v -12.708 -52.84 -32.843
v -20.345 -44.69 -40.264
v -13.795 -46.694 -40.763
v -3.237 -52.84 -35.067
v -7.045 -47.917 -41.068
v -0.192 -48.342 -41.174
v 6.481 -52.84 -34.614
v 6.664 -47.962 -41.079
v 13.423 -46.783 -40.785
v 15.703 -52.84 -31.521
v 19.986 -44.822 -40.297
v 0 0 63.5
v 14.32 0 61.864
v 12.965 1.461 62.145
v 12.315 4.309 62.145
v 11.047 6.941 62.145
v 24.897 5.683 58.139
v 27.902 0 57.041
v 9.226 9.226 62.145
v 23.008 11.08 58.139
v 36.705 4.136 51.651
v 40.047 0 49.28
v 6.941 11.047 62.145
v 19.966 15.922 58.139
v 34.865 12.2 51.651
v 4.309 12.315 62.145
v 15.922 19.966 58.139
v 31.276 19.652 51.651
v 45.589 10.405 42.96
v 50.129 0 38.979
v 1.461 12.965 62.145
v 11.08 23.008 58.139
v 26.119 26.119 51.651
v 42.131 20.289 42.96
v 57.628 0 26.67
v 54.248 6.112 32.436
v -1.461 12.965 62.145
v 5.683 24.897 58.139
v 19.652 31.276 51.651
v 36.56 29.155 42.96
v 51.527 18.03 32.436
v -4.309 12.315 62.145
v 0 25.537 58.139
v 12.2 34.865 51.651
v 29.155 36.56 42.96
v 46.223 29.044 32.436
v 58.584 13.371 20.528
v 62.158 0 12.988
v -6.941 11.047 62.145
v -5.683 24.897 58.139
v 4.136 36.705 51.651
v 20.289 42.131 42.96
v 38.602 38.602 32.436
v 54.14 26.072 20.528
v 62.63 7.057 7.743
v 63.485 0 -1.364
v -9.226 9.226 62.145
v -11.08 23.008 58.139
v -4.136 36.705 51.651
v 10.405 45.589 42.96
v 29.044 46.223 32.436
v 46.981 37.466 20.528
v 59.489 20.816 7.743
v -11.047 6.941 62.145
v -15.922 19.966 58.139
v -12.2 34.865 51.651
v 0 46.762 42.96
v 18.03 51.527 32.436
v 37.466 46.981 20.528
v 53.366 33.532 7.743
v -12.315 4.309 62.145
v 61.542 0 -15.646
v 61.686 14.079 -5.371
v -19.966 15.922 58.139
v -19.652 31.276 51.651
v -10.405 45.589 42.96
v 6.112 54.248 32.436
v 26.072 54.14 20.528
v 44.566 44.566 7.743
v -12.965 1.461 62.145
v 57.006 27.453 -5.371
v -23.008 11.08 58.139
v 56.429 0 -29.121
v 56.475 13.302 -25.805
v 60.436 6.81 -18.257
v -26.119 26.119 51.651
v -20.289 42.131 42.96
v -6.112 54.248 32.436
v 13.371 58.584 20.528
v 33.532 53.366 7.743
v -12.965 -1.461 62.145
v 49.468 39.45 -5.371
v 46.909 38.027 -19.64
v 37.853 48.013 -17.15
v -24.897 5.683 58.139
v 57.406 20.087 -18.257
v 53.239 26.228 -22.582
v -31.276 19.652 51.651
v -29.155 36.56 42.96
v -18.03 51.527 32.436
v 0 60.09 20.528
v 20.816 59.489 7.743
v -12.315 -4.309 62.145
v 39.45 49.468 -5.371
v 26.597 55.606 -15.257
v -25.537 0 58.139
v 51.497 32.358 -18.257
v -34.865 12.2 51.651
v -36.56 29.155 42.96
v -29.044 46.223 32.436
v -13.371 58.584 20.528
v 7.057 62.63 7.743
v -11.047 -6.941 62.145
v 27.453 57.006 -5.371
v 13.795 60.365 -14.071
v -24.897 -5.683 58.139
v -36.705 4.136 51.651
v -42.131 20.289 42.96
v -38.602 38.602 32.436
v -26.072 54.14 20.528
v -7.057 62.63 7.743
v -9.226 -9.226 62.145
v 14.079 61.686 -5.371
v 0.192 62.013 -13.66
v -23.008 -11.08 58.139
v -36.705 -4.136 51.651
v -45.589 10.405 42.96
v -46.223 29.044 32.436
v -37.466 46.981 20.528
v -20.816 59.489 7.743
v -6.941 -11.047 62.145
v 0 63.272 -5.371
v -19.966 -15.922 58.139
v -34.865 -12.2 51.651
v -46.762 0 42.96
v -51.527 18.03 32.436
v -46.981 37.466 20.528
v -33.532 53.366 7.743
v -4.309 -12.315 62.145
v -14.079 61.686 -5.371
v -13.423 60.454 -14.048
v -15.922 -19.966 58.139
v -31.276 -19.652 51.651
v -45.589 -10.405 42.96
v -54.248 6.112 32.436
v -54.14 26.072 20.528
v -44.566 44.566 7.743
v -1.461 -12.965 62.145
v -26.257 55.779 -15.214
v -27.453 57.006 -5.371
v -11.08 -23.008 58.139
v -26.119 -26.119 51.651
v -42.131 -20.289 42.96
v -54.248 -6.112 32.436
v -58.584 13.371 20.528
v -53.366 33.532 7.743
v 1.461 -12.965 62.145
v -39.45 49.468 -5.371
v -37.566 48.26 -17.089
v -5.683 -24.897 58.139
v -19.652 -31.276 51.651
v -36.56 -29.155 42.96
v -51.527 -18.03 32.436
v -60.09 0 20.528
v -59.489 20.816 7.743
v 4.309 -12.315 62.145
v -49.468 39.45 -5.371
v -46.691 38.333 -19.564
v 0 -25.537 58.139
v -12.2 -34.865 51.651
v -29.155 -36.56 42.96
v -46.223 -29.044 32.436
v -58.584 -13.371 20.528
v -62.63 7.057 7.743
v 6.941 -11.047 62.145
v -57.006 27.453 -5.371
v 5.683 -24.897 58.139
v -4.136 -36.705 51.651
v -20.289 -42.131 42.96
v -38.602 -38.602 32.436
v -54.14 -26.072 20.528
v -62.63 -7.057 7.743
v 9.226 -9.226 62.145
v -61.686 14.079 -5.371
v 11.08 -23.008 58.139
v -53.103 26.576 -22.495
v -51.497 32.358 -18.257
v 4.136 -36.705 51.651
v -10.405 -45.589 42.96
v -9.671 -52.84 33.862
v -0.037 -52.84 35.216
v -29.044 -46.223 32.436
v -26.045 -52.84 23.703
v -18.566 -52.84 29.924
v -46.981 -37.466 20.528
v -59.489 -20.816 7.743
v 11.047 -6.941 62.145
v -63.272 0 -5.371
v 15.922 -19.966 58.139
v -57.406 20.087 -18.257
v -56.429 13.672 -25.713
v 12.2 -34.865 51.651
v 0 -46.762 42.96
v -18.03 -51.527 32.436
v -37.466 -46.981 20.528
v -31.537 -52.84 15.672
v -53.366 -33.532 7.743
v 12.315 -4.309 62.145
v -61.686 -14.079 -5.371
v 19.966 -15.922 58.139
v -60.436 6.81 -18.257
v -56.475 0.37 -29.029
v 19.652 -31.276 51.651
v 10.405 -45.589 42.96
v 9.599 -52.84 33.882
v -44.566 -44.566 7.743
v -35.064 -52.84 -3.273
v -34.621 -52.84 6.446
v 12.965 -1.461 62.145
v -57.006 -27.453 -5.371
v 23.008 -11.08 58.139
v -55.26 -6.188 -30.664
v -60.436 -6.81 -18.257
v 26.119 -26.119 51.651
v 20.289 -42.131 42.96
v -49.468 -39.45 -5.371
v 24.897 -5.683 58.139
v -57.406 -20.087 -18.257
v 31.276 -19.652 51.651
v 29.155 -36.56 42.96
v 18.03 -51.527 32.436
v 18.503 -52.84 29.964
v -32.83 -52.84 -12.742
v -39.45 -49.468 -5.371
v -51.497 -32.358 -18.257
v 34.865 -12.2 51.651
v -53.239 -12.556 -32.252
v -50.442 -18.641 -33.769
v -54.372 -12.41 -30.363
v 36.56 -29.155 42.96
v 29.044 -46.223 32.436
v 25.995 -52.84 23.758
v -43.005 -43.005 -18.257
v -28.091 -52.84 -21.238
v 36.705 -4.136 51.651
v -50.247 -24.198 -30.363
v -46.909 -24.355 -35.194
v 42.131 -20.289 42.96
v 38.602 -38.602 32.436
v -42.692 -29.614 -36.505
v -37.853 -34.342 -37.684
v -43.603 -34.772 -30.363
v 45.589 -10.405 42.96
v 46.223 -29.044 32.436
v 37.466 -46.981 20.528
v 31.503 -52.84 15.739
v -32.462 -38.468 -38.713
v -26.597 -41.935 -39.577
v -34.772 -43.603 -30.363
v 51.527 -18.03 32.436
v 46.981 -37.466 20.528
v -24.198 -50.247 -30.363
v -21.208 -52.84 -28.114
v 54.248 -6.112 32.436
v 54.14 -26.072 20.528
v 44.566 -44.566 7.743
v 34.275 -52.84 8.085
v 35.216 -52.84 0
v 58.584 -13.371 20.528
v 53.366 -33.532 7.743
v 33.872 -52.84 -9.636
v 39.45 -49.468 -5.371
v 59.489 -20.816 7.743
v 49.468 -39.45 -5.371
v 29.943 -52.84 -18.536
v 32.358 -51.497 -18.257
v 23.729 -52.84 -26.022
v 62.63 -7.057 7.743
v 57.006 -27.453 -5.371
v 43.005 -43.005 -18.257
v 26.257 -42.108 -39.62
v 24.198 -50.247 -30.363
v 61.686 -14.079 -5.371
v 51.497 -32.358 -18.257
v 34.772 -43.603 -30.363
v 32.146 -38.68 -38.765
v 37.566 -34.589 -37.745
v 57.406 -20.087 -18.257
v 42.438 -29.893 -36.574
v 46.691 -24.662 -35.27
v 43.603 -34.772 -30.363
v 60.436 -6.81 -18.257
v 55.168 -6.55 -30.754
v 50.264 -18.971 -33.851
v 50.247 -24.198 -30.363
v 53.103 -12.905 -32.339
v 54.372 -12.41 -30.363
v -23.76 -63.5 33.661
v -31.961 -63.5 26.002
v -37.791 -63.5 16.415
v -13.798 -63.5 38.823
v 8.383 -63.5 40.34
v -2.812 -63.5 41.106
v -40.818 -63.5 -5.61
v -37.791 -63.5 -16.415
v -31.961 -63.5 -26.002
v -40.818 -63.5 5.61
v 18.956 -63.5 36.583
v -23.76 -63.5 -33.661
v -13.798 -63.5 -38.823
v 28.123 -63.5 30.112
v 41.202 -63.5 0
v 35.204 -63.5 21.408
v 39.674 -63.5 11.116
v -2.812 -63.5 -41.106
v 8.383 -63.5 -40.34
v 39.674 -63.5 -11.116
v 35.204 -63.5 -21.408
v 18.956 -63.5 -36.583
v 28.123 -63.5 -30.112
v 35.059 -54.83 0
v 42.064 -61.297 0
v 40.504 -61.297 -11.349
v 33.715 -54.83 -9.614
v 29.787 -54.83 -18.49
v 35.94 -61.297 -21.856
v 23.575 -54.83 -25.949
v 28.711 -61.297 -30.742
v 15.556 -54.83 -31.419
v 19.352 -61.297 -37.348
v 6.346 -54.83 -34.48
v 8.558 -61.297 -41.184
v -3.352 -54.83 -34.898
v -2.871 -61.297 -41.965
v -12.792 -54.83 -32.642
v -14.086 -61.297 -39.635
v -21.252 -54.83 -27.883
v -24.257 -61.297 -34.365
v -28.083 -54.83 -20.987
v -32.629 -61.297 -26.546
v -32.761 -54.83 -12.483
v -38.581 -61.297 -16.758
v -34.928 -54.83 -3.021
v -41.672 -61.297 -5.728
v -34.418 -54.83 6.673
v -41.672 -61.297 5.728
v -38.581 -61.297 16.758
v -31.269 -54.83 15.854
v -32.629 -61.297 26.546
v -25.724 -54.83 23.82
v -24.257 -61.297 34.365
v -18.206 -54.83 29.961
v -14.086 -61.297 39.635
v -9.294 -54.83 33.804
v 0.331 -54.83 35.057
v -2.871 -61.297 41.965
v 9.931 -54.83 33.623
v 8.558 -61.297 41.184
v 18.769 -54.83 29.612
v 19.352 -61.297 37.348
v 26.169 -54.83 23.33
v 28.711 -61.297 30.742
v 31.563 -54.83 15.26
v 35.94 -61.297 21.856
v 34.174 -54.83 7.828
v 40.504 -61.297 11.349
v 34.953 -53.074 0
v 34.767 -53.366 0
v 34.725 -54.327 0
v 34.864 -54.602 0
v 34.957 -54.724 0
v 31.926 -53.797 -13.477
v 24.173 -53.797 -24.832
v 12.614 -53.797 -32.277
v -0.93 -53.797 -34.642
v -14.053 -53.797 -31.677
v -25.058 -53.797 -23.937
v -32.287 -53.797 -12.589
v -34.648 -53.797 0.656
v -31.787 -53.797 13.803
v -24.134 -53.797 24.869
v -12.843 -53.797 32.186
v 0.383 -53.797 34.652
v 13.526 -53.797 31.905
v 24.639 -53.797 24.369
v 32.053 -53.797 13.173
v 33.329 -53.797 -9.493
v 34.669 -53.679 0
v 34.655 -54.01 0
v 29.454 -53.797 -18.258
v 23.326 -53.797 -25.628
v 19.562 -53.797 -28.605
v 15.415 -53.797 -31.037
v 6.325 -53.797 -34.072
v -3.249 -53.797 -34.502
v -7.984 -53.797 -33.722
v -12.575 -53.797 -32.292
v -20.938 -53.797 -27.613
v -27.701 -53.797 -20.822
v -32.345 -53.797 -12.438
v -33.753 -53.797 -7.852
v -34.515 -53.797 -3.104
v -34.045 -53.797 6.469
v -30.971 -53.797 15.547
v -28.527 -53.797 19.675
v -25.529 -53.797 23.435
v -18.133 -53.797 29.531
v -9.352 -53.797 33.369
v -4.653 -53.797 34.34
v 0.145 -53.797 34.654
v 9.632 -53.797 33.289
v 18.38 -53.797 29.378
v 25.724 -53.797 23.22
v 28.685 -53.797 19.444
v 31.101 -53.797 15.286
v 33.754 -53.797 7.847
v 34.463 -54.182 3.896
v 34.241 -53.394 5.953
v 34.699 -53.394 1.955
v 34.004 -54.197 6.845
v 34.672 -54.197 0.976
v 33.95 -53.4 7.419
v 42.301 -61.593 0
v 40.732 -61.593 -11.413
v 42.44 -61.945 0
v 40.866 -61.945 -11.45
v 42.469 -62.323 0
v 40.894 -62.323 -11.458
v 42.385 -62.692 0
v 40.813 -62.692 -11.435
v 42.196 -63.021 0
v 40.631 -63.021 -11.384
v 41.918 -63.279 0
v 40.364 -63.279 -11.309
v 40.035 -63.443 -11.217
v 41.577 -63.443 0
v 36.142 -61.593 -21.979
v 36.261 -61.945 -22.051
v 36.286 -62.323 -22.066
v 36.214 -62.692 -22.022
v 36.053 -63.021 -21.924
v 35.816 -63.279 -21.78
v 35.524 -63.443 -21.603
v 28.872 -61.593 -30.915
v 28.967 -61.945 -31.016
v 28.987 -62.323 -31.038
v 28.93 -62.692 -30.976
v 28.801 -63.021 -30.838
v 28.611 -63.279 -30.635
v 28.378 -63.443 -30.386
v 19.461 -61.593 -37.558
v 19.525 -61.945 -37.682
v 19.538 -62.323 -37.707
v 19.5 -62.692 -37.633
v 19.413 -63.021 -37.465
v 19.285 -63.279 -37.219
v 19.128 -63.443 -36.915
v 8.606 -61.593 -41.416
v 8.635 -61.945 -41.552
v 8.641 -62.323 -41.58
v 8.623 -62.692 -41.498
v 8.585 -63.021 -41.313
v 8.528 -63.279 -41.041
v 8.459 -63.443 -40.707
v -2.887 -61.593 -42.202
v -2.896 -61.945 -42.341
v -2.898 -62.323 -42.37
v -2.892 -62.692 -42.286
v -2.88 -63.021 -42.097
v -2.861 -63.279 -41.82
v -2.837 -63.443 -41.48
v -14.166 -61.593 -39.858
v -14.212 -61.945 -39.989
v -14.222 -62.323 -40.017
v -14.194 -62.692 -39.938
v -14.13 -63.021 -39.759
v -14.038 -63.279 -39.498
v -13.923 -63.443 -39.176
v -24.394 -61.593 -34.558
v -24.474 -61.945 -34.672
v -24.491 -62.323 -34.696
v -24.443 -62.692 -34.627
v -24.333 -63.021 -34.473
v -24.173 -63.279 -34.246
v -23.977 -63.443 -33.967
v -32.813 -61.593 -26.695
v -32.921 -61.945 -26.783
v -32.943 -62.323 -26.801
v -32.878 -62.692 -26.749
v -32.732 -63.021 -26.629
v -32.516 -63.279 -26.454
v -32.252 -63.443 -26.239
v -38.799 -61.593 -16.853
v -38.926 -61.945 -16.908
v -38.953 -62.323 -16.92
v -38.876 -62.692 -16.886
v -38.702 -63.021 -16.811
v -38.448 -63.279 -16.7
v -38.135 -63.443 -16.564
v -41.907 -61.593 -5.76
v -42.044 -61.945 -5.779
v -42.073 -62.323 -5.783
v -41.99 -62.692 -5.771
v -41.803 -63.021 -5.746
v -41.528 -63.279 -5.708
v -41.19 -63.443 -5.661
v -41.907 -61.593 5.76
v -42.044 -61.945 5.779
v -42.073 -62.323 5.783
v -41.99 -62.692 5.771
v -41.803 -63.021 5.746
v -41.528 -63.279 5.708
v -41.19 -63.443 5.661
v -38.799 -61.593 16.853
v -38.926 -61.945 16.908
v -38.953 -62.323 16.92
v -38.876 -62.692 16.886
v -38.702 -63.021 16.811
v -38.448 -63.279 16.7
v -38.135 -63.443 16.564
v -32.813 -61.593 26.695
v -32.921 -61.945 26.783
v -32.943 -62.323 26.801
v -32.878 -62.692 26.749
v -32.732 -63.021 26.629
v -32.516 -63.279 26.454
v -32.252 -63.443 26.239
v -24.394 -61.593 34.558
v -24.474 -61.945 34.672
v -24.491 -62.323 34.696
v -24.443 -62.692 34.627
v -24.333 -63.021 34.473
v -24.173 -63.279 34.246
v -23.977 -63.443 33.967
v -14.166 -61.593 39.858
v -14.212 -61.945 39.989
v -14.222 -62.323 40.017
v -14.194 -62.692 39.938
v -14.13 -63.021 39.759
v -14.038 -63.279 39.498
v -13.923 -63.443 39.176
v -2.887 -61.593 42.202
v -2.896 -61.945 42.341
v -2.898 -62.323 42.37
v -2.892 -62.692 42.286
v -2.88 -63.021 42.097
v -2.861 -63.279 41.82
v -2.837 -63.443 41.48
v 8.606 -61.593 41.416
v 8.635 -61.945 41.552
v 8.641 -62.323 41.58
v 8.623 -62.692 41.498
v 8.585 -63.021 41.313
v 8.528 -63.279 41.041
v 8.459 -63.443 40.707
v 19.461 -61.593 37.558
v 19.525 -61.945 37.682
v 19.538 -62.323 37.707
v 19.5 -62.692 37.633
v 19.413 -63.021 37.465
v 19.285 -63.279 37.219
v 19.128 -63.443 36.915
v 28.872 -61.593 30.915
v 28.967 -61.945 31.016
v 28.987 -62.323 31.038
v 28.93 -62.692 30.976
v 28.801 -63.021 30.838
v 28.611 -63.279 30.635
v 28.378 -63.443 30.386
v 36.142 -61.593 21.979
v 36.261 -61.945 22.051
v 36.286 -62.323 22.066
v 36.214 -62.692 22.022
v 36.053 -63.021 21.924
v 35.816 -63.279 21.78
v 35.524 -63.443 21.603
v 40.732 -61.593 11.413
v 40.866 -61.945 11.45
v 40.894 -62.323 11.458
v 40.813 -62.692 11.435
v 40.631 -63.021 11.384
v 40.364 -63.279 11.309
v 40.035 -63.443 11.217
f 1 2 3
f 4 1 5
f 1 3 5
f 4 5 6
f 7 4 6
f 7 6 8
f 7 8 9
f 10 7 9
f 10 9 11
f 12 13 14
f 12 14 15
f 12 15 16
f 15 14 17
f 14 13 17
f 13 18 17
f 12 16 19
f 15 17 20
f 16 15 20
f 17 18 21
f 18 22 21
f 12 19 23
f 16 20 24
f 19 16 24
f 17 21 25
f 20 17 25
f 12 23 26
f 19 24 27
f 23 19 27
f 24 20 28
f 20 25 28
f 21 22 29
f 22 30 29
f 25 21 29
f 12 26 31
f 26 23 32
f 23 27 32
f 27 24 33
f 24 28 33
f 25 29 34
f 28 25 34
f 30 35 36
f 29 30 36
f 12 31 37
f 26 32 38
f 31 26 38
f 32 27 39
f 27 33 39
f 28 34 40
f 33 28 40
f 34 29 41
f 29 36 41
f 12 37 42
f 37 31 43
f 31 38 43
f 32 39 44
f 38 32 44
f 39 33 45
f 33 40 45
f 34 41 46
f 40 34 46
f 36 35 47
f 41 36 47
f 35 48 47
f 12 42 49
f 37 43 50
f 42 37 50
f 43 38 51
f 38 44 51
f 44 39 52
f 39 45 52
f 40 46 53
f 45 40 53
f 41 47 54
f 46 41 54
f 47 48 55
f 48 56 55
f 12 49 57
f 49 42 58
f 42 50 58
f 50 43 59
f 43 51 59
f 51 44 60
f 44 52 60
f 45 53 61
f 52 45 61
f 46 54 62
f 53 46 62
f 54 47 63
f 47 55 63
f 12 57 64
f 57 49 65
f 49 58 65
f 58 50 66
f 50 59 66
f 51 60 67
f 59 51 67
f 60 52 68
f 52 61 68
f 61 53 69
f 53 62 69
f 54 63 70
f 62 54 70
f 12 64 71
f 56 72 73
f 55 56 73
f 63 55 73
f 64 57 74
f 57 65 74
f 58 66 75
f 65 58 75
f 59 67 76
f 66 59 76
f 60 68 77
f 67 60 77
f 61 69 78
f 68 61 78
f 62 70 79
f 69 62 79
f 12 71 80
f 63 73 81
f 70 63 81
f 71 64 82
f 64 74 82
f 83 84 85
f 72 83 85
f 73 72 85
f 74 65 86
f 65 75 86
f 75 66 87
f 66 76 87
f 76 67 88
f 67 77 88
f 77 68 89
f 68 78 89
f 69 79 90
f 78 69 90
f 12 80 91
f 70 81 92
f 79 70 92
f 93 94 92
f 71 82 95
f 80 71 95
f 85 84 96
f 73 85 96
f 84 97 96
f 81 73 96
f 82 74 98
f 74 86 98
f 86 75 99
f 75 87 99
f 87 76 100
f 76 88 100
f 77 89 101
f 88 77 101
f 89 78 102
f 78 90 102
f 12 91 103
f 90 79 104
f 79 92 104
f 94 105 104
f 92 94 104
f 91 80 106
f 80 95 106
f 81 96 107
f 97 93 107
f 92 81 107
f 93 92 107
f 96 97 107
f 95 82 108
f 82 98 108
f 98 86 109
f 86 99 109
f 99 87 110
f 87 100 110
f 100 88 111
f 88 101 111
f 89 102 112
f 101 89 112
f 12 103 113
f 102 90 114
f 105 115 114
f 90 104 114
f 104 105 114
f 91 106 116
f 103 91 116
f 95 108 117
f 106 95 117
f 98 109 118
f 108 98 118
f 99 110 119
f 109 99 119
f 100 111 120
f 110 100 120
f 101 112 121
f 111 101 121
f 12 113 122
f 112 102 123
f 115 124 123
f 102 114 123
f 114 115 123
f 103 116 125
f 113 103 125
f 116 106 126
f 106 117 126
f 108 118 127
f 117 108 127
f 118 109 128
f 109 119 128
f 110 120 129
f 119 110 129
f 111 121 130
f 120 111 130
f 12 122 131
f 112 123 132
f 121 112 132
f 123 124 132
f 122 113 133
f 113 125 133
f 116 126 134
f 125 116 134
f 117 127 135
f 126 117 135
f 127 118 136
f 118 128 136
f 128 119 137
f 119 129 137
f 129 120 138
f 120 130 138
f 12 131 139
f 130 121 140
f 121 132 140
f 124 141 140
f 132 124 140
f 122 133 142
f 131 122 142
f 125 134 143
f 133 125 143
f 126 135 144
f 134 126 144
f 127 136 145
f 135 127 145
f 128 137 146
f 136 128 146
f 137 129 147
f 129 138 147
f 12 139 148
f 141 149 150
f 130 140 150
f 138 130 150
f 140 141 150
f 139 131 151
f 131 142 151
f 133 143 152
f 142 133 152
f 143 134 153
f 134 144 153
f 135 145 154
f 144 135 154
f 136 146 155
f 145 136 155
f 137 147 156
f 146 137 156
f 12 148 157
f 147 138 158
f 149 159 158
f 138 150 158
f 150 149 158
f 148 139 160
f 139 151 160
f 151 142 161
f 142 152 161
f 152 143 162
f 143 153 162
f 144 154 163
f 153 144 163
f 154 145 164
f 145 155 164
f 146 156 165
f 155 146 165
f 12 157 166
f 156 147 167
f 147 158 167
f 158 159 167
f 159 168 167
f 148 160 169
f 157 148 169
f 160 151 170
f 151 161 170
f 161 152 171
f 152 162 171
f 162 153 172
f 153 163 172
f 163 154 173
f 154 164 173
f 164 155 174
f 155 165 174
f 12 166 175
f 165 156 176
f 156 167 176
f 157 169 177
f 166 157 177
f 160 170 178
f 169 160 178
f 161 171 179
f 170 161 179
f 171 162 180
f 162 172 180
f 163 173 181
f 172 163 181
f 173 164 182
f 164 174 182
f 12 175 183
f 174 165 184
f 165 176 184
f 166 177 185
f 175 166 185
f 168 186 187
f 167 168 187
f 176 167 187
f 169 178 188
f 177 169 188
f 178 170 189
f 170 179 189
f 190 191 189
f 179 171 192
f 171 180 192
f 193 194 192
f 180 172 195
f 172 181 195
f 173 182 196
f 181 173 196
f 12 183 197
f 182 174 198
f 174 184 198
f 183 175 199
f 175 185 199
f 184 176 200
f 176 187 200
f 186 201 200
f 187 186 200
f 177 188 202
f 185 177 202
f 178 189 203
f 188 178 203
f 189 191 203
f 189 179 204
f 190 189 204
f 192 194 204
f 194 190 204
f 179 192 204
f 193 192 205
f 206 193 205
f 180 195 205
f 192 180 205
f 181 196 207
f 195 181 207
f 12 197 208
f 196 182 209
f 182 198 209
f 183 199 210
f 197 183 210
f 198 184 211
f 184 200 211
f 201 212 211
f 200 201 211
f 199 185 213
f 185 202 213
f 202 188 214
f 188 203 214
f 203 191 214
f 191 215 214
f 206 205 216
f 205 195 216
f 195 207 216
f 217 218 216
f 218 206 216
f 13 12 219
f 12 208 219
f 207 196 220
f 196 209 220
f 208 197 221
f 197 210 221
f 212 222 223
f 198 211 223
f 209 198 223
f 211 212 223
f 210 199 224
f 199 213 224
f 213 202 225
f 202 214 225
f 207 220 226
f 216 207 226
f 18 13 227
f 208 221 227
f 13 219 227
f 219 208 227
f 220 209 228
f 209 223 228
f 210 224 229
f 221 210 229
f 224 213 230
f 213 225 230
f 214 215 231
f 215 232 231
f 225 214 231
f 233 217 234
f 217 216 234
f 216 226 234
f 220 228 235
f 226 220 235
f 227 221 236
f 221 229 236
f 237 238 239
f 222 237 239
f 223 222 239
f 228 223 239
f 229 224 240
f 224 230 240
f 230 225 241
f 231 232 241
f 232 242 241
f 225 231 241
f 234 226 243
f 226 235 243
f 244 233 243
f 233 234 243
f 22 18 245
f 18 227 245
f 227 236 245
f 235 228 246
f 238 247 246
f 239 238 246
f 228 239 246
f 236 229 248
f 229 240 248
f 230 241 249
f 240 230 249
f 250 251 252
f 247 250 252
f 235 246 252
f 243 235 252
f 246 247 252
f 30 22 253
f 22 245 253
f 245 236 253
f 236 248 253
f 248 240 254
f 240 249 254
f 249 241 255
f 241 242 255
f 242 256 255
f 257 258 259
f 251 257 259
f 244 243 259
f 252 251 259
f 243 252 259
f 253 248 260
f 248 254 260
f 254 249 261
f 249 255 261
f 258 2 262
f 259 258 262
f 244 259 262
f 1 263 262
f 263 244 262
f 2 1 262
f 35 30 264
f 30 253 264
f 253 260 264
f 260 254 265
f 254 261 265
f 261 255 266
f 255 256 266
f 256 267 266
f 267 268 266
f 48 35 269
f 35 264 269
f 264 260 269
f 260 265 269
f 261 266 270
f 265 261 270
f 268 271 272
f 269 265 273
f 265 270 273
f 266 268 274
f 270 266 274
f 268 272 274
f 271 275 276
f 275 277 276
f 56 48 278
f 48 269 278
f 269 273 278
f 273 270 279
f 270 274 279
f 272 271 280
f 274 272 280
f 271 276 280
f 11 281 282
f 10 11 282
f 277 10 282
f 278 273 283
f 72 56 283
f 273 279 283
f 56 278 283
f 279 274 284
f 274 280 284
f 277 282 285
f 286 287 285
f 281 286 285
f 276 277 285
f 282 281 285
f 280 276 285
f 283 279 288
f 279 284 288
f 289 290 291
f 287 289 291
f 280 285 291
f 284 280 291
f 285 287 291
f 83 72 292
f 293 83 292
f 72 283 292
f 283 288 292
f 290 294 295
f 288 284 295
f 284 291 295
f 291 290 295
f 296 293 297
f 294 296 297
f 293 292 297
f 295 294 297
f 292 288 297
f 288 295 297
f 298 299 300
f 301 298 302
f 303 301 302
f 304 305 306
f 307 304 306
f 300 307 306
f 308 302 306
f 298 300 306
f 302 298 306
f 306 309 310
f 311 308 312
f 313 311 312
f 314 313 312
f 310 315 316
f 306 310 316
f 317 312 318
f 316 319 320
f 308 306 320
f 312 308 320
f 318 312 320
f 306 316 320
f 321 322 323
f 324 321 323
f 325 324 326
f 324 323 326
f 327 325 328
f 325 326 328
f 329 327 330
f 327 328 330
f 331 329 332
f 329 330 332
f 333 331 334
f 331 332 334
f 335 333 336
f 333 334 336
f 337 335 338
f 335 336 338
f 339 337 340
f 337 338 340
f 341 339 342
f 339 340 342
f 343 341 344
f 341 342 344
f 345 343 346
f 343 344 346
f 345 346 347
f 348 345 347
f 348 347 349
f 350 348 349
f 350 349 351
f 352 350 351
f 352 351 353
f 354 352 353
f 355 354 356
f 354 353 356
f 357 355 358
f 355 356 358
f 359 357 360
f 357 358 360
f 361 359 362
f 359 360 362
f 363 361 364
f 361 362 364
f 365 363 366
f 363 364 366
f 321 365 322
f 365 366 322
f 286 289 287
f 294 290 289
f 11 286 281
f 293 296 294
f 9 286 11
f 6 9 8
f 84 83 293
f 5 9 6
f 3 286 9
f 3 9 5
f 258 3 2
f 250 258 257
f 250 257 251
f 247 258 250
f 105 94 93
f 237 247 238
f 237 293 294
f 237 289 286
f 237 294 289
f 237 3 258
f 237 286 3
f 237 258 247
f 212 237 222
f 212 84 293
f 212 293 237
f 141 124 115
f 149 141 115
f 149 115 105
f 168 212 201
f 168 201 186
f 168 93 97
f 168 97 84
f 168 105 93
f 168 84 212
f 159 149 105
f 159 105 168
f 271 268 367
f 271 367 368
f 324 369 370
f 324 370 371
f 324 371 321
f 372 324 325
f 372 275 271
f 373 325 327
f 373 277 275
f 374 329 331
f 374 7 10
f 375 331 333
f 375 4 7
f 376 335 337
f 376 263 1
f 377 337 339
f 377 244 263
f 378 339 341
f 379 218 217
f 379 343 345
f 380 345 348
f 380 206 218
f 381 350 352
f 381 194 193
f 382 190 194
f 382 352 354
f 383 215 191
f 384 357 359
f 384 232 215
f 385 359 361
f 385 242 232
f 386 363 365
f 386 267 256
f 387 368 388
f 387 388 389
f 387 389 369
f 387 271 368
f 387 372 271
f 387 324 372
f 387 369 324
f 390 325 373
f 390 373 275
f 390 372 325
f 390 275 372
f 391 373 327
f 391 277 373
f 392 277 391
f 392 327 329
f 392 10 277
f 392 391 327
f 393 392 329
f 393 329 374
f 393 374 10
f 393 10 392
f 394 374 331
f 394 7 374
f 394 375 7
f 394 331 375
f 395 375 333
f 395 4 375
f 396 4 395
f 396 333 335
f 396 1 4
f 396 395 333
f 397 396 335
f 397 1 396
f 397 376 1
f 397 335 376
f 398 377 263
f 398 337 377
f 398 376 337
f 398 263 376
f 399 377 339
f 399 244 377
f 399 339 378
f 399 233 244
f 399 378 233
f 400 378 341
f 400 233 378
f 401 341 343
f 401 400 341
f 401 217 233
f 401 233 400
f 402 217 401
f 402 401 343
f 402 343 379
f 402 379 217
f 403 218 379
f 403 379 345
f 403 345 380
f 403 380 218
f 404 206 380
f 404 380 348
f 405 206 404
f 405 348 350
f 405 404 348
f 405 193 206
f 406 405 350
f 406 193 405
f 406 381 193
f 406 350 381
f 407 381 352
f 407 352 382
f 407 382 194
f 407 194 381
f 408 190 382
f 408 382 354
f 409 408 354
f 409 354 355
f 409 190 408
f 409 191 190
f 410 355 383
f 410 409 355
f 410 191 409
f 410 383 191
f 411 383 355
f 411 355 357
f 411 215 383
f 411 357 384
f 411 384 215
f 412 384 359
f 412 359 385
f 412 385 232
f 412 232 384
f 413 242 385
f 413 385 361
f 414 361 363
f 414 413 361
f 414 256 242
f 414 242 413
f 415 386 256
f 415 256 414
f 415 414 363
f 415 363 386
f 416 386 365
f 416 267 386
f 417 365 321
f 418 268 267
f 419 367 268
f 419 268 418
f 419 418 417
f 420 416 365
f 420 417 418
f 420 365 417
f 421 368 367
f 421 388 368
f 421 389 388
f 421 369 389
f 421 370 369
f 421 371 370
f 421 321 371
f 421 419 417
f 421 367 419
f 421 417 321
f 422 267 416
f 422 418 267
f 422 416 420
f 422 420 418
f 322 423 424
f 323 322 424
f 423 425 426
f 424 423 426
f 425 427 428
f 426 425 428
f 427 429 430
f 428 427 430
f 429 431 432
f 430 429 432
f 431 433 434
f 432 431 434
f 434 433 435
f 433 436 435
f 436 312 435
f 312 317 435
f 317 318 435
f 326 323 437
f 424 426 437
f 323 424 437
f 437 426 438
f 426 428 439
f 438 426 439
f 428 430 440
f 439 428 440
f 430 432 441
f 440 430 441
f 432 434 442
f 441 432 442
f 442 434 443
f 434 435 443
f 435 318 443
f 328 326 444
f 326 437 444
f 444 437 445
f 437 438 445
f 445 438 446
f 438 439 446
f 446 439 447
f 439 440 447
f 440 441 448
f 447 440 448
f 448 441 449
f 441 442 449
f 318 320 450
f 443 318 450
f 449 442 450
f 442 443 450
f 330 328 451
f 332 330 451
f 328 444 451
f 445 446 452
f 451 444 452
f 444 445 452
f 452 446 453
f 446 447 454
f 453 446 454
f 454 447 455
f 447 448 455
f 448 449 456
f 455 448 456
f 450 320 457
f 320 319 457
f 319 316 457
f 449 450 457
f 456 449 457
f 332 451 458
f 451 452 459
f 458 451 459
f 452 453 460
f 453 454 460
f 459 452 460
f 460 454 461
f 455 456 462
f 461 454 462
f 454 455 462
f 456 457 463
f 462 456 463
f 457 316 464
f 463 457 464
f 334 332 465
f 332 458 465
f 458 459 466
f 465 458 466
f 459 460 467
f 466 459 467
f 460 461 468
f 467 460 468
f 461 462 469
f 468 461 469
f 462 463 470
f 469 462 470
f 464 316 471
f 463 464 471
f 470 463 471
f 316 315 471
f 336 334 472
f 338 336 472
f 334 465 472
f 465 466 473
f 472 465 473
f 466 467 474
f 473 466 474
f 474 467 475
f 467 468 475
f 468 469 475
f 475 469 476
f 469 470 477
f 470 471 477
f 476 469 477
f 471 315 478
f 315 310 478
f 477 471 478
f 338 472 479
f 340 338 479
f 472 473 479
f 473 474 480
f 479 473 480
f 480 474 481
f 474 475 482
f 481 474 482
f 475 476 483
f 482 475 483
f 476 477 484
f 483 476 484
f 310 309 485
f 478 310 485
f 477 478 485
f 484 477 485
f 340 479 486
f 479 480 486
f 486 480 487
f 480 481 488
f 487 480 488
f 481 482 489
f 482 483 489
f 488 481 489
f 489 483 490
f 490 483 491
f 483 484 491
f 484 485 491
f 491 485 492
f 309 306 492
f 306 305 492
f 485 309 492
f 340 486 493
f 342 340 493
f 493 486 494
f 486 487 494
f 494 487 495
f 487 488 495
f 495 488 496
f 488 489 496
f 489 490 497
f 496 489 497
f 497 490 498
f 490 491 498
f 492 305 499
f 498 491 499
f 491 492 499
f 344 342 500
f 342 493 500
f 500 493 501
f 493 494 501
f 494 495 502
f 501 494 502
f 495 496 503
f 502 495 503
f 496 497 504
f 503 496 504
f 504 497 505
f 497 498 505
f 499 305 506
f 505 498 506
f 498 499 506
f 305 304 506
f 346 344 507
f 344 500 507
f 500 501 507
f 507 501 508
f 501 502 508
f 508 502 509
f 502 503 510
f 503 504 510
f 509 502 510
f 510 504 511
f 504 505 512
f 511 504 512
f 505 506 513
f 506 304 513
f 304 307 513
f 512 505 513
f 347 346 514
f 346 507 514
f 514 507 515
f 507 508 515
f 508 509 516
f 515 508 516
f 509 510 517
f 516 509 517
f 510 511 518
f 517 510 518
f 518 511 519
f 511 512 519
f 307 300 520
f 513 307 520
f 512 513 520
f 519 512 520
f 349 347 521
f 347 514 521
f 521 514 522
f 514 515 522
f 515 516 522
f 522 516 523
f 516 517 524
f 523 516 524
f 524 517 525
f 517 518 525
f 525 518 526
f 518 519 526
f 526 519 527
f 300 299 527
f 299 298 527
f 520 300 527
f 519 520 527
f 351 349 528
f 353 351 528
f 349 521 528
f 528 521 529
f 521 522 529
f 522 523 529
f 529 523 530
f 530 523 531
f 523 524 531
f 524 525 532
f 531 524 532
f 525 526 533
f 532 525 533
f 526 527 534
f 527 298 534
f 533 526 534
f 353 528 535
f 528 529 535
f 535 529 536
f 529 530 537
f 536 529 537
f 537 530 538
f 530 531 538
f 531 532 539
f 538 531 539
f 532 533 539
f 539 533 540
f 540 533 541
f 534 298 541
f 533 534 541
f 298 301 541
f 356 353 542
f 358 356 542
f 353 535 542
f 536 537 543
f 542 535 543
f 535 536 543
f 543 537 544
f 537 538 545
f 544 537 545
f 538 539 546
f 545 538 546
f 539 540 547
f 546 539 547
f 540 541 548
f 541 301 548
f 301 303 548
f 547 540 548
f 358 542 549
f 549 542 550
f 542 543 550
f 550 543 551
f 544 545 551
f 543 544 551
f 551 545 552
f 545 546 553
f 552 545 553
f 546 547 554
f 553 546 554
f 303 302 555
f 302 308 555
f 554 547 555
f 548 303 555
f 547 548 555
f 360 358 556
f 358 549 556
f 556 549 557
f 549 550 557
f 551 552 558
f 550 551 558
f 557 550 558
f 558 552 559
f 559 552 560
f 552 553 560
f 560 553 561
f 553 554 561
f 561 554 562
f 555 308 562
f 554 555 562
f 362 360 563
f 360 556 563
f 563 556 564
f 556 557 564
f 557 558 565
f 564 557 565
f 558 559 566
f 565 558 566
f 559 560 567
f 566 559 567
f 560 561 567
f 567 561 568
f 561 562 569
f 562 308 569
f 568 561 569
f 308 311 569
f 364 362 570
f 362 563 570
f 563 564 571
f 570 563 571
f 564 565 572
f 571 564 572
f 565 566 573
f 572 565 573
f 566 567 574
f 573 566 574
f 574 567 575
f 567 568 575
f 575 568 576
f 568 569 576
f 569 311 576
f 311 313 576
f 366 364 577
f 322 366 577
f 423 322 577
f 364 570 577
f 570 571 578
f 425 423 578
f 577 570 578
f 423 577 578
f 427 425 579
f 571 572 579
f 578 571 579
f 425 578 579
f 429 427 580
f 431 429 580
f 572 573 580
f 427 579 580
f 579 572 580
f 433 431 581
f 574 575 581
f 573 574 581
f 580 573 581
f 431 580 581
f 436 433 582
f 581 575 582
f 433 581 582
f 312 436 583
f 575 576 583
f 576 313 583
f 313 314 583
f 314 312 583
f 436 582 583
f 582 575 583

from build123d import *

# Parameters (mm, degrees)
SKETCH8_R          = 27.942007566
SKETCH9_R          = 44.45
FILLET2_R          = 1.27
FILLET3_R          = 1.27
SKETCH12_R         = 57.37388449
CUT_EXTRUDE1_DEPTH = 38.1


with BuildPart() as part:
    # Base_sketch → Revolve2 (revolve)
    with BuildSketch(Plane(origin=(0, 0, 0), x_dir=(1, 0, 0), z_dir=(0, 1, 0))):
        with BuildLine():
            Line((0, 63.5), (0, -63.5))
            ThreePointArc((0, -63.5), (63.5, 0), (0, 63.5))
        make_face()
    revolve(axis=Axis((0, 0, -63.5), (0, 0, 1)))


with BuildPart() as body_2:
    # Sketch8 → Loft1 section 0
    with BuildSketch(Plane(origin=(0, -48.26, 0), x_dir=(1, 0, 0), z_dir=(0, 1, 0))):
        Circle(SKETCH8_R)
    # Sketch9 → Loft1 section 1
    with BuildSketch(Plane(origin=(0, -63.5, 0), x_dir=(1, 0, 0), z_dir=(0, 1, 0))):
        Circle(SKETCH9_R)
    loft()

    # Combine1: union part
    add(part.part)

    # Fillet2
    fillet2_edges = [body_2.edges().sort_by_distance(p)[0] for p in [
        (-33.857266982, -53.720903494, -1.69e-07),
    ]]
    fillet(fillet2_edges, radius=FILLET2_R)

    # Fillet3
    fillet3_edges = [body_2.edges().sort_by_distance(p)[0] for p in [
        (-44.45, -63.5, 0),
    ]]
    fillet(fillet3_edges, radius=FILLET3_R)

    # Sketch12 → Cut-Extrude1 (cut)
    with BuildSketch(Plane(origin=(0, 6.835797067, -27.41688454), x_dir=(-1, 0, 0), z_dir=(0, 0.2419218955996649, -0.9702957262759973))):
        Circle(SKETCH12_R)
    extrude(amount=CUT_EXTRUDE1_DEPTH, mode=Mode.SUBTRACT)


solid = body_2.part
